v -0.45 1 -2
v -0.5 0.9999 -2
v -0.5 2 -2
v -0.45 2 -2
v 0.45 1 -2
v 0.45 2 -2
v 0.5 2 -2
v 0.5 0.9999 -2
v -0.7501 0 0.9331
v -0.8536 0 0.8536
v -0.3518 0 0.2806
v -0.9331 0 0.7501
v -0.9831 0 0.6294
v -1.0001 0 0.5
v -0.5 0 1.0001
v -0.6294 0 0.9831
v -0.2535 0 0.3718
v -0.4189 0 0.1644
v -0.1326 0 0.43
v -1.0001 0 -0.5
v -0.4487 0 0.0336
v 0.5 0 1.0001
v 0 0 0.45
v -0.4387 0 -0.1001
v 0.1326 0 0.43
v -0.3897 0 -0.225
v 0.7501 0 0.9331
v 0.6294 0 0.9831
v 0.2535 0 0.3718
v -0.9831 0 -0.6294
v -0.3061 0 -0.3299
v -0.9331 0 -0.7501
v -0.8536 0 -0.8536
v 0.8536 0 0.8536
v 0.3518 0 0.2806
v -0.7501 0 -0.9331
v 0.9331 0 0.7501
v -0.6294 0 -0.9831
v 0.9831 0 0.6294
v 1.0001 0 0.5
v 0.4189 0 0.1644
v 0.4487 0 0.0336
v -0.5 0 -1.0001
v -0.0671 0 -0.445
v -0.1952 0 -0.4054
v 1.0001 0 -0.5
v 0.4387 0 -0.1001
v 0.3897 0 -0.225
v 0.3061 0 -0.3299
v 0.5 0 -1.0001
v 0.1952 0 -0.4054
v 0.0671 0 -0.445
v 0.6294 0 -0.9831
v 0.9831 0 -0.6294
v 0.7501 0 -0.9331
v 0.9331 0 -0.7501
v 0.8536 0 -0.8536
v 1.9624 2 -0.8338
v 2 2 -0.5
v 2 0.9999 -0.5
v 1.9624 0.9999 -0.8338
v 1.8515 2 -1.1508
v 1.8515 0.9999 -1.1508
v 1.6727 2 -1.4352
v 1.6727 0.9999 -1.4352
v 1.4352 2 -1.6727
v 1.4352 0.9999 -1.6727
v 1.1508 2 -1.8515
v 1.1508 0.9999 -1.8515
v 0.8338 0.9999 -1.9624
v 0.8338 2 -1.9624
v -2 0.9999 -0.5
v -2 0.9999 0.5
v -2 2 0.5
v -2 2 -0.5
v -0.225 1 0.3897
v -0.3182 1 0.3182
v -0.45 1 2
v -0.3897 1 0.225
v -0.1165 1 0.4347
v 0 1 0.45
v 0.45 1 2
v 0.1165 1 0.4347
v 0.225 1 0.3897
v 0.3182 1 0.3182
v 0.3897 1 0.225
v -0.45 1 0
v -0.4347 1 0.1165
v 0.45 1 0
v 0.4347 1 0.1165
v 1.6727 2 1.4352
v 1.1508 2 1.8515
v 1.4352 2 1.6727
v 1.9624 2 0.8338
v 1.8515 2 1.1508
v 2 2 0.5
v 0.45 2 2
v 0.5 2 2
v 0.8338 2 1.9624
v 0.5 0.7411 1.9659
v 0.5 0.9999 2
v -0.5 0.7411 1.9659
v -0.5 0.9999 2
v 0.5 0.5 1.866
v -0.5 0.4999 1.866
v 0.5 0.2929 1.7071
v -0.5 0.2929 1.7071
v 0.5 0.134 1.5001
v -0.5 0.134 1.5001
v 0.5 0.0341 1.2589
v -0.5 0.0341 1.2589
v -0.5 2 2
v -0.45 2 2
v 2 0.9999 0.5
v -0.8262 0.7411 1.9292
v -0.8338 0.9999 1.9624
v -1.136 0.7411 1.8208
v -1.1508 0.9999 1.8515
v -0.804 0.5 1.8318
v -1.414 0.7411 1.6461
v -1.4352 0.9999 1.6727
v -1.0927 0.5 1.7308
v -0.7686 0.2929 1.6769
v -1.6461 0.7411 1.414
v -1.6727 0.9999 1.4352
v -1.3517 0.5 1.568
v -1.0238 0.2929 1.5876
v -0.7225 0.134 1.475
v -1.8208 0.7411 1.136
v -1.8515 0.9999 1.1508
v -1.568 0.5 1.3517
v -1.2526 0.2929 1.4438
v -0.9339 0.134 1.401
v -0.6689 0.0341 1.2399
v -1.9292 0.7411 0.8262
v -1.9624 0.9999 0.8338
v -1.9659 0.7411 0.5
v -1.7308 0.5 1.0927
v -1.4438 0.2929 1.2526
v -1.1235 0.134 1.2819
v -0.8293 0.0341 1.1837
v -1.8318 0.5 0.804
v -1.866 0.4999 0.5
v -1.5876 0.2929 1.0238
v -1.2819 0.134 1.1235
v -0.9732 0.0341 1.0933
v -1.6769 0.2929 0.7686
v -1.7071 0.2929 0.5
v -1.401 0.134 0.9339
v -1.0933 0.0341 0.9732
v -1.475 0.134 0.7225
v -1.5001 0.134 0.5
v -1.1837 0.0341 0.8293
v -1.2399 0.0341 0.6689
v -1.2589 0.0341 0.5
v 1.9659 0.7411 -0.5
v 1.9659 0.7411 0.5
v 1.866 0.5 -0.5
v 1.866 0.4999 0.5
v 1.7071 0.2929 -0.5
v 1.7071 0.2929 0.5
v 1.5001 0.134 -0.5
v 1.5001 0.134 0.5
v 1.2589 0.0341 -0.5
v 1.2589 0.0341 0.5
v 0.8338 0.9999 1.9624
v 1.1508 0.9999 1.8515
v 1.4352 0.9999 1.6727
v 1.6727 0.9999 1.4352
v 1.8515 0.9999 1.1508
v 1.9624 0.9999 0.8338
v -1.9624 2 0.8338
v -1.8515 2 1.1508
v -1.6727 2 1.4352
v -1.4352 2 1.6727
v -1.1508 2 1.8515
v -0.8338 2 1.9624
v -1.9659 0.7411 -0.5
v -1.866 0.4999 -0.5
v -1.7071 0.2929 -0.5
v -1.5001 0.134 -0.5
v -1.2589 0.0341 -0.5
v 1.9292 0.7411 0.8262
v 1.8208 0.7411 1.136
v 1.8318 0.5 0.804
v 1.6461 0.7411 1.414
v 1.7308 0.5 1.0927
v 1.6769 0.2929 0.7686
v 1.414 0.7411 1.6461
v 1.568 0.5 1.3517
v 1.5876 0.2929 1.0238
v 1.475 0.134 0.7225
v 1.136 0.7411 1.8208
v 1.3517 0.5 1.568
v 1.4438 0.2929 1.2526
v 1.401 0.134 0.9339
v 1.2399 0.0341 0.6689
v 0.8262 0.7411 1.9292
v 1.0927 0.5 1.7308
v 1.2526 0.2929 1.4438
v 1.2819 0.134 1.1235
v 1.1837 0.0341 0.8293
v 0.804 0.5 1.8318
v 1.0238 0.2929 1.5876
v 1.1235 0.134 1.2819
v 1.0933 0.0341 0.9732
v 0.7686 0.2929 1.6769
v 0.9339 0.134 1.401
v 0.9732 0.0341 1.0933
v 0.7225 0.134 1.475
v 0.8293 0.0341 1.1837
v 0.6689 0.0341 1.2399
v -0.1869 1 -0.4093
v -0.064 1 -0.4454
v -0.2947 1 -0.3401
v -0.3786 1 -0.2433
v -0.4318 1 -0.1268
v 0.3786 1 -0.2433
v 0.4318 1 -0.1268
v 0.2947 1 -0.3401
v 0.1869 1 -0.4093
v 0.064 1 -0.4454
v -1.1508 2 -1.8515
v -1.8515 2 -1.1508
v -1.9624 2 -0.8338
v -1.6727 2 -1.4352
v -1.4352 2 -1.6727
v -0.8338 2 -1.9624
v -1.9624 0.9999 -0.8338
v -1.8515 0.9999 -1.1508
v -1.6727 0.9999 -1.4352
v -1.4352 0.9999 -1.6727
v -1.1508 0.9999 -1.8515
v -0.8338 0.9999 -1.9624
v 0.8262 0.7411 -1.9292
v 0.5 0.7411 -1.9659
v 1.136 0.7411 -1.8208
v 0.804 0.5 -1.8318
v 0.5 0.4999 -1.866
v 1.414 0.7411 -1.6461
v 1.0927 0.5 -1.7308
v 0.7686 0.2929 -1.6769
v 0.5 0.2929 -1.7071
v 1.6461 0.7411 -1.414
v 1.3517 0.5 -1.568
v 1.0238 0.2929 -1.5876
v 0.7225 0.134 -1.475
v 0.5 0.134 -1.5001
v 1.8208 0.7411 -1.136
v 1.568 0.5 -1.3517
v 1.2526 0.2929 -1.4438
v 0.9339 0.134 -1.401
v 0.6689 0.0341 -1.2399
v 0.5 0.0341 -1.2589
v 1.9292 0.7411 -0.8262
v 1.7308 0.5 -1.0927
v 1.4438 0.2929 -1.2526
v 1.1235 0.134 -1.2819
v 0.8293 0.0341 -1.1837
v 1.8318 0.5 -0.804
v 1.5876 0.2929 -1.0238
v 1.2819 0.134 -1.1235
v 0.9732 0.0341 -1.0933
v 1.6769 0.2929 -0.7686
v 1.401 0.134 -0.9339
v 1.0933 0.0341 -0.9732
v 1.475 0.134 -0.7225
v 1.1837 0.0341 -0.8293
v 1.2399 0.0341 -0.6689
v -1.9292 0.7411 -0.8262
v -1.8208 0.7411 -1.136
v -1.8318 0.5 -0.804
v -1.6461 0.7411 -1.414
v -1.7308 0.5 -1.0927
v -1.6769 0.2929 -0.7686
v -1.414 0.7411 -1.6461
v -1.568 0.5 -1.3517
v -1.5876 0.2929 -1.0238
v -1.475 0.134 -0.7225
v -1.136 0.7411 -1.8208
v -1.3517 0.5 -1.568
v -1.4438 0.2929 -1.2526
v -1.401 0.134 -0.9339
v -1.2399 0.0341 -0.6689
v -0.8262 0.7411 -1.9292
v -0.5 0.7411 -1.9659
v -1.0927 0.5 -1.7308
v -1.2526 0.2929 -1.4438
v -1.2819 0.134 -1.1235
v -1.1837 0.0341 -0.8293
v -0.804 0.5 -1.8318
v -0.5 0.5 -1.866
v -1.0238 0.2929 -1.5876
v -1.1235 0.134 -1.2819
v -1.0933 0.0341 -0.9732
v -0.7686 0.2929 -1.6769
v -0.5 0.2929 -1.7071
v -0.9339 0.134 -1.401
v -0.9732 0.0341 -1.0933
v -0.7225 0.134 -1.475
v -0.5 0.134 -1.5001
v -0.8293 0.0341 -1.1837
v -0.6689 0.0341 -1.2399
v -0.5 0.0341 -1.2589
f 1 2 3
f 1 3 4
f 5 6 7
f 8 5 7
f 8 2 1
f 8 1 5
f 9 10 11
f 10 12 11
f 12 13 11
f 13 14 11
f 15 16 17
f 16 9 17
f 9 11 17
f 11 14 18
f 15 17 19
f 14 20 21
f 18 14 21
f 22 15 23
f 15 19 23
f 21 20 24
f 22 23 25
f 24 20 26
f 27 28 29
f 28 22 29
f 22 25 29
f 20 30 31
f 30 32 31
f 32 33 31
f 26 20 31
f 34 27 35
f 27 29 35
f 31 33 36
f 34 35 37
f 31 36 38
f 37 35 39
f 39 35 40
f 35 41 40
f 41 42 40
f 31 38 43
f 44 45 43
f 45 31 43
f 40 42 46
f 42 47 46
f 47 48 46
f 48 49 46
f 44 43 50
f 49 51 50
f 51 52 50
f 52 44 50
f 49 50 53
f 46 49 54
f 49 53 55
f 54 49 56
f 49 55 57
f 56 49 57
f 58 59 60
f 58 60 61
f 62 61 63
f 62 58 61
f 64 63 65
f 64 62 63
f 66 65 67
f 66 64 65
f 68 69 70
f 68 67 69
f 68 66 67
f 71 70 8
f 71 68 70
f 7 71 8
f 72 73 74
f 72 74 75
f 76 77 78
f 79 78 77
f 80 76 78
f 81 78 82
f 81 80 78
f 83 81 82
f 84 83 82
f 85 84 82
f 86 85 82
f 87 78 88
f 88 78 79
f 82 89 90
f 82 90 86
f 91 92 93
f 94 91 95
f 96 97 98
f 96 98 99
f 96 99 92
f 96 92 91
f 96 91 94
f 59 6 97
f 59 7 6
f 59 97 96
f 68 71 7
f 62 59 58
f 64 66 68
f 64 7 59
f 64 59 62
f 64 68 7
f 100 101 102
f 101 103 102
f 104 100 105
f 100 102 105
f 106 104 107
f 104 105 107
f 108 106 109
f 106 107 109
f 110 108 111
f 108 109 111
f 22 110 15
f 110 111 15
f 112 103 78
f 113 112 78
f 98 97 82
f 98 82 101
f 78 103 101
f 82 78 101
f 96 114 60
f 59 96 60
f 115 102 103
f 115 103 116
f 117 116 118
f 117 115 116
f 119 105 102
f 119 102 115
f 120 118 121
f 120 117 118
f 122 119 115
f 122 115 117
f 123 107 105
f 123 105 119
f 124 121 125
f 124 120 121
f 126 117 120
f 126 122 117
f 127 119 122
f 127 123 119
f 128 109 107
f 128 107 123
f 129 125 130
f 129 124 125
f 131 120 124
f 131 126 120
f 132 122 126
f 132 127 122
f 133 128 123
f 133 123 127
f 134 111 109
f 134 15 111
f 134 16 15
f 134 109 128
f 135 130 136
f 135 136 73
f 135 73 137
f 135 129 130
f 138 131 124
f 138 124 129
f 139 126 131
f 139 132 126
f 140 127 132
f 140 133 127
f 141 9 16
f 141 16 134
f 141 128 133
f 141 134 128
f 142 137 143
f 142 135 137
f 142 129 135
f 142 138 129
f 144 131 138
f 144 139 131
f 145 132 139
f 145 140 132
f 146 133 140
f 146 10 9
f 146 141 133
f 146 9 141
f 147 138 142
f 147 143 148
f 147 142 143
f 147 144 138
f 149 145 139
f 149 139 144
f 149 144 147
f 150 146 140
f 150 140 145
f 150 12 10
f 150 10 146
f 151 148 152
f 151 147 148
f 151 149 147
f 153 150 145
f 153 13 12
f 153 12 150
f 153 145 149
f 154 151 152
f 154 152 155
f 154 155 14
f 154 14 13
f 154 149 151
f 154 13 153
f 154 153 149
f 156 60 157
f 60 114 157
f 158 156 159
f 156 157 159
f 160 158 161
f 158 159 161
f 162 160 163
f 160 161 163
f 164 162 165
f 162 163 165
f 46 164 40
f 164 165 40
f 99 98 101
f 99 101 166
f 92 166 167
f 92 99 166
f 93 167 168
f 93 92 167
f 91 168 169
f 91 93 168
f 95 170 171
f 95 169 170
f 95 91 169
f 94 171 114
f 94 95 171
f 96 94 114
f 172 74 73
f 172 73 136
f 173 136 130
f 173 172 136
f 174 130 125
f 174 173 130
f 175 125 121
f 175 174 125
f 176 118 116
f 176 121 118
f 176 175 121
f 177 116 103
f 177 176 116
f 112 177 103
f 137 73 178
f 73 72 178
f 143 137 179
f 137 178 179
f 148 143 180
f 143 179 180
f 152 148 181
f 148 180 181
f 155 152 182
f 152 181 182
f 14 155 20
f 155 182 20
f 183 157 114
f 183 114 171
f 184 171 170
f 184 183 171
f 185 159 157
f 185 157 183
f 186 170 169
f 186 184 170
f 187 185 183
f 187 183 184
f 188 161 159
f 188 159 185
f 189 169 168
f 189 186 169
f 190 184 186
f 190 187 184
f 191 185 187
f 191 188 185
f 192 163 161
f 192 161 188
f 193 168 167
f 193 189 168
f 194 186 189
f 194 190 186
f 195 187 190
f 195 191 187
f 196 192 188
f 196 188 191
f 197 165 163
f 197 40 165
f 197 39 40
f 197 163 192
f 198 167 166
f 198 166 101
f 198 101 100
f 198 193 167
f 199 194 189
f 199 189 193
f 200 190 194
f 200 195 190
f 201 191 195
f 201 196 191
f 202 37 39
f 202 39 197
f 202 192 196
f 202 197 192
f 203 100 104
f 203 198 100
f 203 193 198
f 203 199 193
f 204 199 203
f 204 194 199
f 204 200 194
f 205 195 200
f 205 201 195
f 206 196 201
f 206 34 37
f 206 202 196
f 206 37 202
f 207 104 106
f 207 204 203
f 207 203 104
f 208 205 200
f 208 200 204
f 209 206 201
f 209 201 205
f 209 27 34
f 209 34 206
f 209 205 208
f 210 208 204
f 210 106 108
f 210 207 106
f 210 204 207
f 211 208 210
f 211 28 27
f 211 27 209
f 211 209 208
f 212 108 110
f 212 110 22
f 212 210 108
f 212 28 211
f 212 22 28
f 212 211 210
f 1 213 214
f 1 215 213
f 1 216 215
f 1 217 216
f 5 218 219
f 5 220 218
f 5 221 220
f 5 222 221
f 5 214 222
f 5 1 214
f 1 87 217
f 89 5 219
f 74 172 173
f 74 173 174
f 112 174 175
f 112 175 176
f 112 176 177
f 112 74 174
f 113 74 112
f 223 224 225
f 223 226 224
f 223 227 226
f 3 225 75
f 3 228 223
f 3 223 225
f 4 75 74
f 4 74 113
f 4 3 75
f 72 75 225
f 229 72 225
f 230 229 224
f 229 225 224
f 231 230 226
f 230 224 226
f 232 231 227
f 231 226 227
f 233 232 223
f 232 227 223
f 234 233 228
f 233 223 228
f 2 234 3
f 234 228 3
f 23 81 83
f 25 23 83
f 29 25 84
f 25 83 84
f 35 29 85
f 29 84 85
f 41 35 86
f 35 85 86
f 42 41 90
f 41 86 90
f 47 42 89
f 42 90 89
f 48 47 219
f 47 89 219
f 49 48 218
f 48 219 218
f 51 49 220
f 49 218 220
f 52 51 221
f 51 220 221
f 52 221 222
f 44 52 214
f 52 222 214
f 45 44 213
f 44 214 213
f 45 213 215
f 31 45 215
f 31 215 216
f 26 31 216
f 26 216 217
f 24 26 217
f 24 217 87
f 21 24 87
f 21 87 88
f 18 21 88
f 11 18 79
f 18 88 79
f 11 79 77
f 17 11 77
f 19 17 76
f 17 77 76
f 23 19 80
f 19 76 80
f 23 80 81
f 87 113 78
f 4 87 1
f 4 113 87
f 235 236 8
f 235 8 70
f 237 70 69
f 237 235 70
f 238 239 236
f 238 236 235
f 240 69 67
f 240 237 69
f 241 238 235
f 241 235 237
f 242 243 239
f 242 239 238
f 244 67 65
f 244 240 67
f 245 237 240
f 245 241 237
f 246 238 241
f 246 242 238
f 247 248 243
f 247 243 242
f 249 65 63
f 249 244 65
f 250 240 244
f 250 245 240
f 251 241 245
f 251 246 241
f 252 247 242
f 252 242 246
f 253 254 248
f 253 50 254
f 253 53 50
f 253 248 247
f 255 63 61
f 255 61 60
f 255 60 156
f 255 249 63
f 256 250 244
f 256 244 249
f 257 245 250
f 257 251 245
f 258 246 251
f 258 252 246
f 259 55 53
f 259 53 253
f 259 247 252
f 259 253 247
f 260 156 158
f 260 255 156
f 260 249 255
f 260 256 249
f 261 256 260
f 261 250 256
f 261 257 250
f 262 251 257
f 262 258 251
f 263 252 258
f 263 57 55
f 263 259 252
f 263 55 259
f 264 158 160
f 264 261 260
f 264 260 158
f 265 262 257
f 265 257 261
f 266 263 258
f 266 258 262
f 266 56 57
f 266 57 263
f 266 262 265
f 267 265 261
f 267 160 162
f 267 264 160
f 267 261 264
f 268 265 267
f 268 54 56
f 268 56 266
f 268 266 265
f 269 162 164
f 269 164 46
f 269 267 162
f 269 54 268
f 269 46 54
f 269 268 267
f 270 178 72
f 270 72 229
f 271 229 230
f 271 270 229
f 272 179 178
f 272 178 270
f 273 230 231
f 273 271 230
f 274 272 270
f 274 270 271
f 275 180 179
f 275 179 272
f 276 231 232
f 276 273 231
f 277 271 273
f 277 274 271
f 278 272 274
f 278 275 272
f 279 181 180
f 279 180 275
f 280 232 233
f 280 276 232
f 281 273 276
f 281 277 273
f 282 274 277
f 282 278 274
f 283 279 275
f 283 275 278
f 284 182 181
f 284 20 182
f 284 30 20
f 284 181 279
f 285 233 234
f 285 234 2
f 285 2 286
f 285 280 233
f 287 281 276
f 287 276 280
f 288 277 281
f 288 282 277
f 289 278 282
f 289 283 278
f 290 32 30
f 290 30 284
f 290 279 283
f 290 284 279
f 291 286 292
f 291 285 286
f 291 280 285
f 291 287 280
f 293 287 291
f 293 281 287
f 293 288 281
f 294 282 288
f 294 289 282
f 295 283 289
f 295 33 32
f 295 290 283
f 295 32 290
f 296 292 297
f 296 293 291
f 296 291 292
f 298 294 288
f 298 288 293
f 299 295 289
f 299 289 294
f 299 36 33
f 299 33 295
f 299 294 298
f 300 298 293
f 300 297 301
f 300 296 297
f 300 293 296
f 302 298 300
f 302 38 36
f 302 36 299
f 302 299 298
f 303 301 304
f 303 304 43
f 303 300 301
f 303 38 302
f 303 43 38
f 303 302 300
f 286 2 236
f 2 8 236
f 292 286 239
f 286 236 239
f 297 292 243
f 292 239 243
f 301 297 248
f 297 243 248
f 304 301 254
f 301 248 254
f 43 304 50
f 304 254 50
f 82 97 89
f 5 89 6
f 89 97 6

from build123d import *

# Parameters (mm, degrees)
SKETCH_1_W          = 4
SKETCH_1_H          = 4
EXTRUDE_1_DEPTH     = 2
FILLET_1_R          = 1.5
SKETCH_2_R          = 0.45
CUT_EXTRUDE_1_DEPTH = 4.464101615
SKETCH_3_W          = 0.9
SKETCH_3_H          = 4
CUT_EXTRUDE_2_DEPTH = 1
FILLET_3_R          = 1


with BuildPart() as part:
    # 草图1 → 凸台-拉伸1 (new body)
    with BuildSketch(Plane(origin=(0, 0, 0), x_dir=(1, 0, 0), z_dir=(0, 1, 0))):
        Rectangle(SKETCH_1_W, SKETCH_1_H)
    extrude(amount=EXTRUDE_1_DEPTH)

    # 圆角1
    fillet_1_edges = [part.edges().sort_by_distance(p)[0] for p in [
        (-2, 1, -2),
        (2, 1, -2),
        (2, 1, 2),
        (-2, 1, 2),
    ]]
    fillet(fillet_1_edges, radius=FILLET_1_R)

    # 草图2 → 切除-拉伸1 (cut, through all)
    with BuildSketch(Plane(origin=(0, 2, 0), x_dir=(1, 0, 0), z_dir=(0, 1, 0))):
        with Locations(Location((0, 0, 0), (0, 0, 270))):
            Circle(SKETCH_2_R)
    extrude(amount=-CUT_EXTRUDE_1_DEPTH, mode=Mode.SUBTRACT)

    # 草图3 → 切除-拉伸2 (cut)
    with BuildSketch(Plane(origin=(0, 2, 0), x_dir=(1, 0, 0), z_dir=(0, 1, 0))):
        Rectangle(SKETCH_3_W, SKETCH_3_H)
    extrude(amount=-CUT_EXTRUDE_2_DEPTH, mode=Mode.SUBTRACT)

    # 圆角3
    fillet_3_edges = [part.edges().sort_by_distance(p)[0] for p in [
        (-2, 0, 0),
        (0, 0, -2),
        (2, 0, 0),
        (0, 0, 2),
        (-1.560660172, 0, 1.560660172),
        (1.560660172, 0, 1.560660172),
        (1.560660172, 0, -1.560660172),
        (-1.560660172, 0, -1.560660172),
    ]]
    fillet(fillet_3_edges, radius=FILLET_3_R - 0.0001)  # a hair under: the kernel refuses the full size


solid = part.part
